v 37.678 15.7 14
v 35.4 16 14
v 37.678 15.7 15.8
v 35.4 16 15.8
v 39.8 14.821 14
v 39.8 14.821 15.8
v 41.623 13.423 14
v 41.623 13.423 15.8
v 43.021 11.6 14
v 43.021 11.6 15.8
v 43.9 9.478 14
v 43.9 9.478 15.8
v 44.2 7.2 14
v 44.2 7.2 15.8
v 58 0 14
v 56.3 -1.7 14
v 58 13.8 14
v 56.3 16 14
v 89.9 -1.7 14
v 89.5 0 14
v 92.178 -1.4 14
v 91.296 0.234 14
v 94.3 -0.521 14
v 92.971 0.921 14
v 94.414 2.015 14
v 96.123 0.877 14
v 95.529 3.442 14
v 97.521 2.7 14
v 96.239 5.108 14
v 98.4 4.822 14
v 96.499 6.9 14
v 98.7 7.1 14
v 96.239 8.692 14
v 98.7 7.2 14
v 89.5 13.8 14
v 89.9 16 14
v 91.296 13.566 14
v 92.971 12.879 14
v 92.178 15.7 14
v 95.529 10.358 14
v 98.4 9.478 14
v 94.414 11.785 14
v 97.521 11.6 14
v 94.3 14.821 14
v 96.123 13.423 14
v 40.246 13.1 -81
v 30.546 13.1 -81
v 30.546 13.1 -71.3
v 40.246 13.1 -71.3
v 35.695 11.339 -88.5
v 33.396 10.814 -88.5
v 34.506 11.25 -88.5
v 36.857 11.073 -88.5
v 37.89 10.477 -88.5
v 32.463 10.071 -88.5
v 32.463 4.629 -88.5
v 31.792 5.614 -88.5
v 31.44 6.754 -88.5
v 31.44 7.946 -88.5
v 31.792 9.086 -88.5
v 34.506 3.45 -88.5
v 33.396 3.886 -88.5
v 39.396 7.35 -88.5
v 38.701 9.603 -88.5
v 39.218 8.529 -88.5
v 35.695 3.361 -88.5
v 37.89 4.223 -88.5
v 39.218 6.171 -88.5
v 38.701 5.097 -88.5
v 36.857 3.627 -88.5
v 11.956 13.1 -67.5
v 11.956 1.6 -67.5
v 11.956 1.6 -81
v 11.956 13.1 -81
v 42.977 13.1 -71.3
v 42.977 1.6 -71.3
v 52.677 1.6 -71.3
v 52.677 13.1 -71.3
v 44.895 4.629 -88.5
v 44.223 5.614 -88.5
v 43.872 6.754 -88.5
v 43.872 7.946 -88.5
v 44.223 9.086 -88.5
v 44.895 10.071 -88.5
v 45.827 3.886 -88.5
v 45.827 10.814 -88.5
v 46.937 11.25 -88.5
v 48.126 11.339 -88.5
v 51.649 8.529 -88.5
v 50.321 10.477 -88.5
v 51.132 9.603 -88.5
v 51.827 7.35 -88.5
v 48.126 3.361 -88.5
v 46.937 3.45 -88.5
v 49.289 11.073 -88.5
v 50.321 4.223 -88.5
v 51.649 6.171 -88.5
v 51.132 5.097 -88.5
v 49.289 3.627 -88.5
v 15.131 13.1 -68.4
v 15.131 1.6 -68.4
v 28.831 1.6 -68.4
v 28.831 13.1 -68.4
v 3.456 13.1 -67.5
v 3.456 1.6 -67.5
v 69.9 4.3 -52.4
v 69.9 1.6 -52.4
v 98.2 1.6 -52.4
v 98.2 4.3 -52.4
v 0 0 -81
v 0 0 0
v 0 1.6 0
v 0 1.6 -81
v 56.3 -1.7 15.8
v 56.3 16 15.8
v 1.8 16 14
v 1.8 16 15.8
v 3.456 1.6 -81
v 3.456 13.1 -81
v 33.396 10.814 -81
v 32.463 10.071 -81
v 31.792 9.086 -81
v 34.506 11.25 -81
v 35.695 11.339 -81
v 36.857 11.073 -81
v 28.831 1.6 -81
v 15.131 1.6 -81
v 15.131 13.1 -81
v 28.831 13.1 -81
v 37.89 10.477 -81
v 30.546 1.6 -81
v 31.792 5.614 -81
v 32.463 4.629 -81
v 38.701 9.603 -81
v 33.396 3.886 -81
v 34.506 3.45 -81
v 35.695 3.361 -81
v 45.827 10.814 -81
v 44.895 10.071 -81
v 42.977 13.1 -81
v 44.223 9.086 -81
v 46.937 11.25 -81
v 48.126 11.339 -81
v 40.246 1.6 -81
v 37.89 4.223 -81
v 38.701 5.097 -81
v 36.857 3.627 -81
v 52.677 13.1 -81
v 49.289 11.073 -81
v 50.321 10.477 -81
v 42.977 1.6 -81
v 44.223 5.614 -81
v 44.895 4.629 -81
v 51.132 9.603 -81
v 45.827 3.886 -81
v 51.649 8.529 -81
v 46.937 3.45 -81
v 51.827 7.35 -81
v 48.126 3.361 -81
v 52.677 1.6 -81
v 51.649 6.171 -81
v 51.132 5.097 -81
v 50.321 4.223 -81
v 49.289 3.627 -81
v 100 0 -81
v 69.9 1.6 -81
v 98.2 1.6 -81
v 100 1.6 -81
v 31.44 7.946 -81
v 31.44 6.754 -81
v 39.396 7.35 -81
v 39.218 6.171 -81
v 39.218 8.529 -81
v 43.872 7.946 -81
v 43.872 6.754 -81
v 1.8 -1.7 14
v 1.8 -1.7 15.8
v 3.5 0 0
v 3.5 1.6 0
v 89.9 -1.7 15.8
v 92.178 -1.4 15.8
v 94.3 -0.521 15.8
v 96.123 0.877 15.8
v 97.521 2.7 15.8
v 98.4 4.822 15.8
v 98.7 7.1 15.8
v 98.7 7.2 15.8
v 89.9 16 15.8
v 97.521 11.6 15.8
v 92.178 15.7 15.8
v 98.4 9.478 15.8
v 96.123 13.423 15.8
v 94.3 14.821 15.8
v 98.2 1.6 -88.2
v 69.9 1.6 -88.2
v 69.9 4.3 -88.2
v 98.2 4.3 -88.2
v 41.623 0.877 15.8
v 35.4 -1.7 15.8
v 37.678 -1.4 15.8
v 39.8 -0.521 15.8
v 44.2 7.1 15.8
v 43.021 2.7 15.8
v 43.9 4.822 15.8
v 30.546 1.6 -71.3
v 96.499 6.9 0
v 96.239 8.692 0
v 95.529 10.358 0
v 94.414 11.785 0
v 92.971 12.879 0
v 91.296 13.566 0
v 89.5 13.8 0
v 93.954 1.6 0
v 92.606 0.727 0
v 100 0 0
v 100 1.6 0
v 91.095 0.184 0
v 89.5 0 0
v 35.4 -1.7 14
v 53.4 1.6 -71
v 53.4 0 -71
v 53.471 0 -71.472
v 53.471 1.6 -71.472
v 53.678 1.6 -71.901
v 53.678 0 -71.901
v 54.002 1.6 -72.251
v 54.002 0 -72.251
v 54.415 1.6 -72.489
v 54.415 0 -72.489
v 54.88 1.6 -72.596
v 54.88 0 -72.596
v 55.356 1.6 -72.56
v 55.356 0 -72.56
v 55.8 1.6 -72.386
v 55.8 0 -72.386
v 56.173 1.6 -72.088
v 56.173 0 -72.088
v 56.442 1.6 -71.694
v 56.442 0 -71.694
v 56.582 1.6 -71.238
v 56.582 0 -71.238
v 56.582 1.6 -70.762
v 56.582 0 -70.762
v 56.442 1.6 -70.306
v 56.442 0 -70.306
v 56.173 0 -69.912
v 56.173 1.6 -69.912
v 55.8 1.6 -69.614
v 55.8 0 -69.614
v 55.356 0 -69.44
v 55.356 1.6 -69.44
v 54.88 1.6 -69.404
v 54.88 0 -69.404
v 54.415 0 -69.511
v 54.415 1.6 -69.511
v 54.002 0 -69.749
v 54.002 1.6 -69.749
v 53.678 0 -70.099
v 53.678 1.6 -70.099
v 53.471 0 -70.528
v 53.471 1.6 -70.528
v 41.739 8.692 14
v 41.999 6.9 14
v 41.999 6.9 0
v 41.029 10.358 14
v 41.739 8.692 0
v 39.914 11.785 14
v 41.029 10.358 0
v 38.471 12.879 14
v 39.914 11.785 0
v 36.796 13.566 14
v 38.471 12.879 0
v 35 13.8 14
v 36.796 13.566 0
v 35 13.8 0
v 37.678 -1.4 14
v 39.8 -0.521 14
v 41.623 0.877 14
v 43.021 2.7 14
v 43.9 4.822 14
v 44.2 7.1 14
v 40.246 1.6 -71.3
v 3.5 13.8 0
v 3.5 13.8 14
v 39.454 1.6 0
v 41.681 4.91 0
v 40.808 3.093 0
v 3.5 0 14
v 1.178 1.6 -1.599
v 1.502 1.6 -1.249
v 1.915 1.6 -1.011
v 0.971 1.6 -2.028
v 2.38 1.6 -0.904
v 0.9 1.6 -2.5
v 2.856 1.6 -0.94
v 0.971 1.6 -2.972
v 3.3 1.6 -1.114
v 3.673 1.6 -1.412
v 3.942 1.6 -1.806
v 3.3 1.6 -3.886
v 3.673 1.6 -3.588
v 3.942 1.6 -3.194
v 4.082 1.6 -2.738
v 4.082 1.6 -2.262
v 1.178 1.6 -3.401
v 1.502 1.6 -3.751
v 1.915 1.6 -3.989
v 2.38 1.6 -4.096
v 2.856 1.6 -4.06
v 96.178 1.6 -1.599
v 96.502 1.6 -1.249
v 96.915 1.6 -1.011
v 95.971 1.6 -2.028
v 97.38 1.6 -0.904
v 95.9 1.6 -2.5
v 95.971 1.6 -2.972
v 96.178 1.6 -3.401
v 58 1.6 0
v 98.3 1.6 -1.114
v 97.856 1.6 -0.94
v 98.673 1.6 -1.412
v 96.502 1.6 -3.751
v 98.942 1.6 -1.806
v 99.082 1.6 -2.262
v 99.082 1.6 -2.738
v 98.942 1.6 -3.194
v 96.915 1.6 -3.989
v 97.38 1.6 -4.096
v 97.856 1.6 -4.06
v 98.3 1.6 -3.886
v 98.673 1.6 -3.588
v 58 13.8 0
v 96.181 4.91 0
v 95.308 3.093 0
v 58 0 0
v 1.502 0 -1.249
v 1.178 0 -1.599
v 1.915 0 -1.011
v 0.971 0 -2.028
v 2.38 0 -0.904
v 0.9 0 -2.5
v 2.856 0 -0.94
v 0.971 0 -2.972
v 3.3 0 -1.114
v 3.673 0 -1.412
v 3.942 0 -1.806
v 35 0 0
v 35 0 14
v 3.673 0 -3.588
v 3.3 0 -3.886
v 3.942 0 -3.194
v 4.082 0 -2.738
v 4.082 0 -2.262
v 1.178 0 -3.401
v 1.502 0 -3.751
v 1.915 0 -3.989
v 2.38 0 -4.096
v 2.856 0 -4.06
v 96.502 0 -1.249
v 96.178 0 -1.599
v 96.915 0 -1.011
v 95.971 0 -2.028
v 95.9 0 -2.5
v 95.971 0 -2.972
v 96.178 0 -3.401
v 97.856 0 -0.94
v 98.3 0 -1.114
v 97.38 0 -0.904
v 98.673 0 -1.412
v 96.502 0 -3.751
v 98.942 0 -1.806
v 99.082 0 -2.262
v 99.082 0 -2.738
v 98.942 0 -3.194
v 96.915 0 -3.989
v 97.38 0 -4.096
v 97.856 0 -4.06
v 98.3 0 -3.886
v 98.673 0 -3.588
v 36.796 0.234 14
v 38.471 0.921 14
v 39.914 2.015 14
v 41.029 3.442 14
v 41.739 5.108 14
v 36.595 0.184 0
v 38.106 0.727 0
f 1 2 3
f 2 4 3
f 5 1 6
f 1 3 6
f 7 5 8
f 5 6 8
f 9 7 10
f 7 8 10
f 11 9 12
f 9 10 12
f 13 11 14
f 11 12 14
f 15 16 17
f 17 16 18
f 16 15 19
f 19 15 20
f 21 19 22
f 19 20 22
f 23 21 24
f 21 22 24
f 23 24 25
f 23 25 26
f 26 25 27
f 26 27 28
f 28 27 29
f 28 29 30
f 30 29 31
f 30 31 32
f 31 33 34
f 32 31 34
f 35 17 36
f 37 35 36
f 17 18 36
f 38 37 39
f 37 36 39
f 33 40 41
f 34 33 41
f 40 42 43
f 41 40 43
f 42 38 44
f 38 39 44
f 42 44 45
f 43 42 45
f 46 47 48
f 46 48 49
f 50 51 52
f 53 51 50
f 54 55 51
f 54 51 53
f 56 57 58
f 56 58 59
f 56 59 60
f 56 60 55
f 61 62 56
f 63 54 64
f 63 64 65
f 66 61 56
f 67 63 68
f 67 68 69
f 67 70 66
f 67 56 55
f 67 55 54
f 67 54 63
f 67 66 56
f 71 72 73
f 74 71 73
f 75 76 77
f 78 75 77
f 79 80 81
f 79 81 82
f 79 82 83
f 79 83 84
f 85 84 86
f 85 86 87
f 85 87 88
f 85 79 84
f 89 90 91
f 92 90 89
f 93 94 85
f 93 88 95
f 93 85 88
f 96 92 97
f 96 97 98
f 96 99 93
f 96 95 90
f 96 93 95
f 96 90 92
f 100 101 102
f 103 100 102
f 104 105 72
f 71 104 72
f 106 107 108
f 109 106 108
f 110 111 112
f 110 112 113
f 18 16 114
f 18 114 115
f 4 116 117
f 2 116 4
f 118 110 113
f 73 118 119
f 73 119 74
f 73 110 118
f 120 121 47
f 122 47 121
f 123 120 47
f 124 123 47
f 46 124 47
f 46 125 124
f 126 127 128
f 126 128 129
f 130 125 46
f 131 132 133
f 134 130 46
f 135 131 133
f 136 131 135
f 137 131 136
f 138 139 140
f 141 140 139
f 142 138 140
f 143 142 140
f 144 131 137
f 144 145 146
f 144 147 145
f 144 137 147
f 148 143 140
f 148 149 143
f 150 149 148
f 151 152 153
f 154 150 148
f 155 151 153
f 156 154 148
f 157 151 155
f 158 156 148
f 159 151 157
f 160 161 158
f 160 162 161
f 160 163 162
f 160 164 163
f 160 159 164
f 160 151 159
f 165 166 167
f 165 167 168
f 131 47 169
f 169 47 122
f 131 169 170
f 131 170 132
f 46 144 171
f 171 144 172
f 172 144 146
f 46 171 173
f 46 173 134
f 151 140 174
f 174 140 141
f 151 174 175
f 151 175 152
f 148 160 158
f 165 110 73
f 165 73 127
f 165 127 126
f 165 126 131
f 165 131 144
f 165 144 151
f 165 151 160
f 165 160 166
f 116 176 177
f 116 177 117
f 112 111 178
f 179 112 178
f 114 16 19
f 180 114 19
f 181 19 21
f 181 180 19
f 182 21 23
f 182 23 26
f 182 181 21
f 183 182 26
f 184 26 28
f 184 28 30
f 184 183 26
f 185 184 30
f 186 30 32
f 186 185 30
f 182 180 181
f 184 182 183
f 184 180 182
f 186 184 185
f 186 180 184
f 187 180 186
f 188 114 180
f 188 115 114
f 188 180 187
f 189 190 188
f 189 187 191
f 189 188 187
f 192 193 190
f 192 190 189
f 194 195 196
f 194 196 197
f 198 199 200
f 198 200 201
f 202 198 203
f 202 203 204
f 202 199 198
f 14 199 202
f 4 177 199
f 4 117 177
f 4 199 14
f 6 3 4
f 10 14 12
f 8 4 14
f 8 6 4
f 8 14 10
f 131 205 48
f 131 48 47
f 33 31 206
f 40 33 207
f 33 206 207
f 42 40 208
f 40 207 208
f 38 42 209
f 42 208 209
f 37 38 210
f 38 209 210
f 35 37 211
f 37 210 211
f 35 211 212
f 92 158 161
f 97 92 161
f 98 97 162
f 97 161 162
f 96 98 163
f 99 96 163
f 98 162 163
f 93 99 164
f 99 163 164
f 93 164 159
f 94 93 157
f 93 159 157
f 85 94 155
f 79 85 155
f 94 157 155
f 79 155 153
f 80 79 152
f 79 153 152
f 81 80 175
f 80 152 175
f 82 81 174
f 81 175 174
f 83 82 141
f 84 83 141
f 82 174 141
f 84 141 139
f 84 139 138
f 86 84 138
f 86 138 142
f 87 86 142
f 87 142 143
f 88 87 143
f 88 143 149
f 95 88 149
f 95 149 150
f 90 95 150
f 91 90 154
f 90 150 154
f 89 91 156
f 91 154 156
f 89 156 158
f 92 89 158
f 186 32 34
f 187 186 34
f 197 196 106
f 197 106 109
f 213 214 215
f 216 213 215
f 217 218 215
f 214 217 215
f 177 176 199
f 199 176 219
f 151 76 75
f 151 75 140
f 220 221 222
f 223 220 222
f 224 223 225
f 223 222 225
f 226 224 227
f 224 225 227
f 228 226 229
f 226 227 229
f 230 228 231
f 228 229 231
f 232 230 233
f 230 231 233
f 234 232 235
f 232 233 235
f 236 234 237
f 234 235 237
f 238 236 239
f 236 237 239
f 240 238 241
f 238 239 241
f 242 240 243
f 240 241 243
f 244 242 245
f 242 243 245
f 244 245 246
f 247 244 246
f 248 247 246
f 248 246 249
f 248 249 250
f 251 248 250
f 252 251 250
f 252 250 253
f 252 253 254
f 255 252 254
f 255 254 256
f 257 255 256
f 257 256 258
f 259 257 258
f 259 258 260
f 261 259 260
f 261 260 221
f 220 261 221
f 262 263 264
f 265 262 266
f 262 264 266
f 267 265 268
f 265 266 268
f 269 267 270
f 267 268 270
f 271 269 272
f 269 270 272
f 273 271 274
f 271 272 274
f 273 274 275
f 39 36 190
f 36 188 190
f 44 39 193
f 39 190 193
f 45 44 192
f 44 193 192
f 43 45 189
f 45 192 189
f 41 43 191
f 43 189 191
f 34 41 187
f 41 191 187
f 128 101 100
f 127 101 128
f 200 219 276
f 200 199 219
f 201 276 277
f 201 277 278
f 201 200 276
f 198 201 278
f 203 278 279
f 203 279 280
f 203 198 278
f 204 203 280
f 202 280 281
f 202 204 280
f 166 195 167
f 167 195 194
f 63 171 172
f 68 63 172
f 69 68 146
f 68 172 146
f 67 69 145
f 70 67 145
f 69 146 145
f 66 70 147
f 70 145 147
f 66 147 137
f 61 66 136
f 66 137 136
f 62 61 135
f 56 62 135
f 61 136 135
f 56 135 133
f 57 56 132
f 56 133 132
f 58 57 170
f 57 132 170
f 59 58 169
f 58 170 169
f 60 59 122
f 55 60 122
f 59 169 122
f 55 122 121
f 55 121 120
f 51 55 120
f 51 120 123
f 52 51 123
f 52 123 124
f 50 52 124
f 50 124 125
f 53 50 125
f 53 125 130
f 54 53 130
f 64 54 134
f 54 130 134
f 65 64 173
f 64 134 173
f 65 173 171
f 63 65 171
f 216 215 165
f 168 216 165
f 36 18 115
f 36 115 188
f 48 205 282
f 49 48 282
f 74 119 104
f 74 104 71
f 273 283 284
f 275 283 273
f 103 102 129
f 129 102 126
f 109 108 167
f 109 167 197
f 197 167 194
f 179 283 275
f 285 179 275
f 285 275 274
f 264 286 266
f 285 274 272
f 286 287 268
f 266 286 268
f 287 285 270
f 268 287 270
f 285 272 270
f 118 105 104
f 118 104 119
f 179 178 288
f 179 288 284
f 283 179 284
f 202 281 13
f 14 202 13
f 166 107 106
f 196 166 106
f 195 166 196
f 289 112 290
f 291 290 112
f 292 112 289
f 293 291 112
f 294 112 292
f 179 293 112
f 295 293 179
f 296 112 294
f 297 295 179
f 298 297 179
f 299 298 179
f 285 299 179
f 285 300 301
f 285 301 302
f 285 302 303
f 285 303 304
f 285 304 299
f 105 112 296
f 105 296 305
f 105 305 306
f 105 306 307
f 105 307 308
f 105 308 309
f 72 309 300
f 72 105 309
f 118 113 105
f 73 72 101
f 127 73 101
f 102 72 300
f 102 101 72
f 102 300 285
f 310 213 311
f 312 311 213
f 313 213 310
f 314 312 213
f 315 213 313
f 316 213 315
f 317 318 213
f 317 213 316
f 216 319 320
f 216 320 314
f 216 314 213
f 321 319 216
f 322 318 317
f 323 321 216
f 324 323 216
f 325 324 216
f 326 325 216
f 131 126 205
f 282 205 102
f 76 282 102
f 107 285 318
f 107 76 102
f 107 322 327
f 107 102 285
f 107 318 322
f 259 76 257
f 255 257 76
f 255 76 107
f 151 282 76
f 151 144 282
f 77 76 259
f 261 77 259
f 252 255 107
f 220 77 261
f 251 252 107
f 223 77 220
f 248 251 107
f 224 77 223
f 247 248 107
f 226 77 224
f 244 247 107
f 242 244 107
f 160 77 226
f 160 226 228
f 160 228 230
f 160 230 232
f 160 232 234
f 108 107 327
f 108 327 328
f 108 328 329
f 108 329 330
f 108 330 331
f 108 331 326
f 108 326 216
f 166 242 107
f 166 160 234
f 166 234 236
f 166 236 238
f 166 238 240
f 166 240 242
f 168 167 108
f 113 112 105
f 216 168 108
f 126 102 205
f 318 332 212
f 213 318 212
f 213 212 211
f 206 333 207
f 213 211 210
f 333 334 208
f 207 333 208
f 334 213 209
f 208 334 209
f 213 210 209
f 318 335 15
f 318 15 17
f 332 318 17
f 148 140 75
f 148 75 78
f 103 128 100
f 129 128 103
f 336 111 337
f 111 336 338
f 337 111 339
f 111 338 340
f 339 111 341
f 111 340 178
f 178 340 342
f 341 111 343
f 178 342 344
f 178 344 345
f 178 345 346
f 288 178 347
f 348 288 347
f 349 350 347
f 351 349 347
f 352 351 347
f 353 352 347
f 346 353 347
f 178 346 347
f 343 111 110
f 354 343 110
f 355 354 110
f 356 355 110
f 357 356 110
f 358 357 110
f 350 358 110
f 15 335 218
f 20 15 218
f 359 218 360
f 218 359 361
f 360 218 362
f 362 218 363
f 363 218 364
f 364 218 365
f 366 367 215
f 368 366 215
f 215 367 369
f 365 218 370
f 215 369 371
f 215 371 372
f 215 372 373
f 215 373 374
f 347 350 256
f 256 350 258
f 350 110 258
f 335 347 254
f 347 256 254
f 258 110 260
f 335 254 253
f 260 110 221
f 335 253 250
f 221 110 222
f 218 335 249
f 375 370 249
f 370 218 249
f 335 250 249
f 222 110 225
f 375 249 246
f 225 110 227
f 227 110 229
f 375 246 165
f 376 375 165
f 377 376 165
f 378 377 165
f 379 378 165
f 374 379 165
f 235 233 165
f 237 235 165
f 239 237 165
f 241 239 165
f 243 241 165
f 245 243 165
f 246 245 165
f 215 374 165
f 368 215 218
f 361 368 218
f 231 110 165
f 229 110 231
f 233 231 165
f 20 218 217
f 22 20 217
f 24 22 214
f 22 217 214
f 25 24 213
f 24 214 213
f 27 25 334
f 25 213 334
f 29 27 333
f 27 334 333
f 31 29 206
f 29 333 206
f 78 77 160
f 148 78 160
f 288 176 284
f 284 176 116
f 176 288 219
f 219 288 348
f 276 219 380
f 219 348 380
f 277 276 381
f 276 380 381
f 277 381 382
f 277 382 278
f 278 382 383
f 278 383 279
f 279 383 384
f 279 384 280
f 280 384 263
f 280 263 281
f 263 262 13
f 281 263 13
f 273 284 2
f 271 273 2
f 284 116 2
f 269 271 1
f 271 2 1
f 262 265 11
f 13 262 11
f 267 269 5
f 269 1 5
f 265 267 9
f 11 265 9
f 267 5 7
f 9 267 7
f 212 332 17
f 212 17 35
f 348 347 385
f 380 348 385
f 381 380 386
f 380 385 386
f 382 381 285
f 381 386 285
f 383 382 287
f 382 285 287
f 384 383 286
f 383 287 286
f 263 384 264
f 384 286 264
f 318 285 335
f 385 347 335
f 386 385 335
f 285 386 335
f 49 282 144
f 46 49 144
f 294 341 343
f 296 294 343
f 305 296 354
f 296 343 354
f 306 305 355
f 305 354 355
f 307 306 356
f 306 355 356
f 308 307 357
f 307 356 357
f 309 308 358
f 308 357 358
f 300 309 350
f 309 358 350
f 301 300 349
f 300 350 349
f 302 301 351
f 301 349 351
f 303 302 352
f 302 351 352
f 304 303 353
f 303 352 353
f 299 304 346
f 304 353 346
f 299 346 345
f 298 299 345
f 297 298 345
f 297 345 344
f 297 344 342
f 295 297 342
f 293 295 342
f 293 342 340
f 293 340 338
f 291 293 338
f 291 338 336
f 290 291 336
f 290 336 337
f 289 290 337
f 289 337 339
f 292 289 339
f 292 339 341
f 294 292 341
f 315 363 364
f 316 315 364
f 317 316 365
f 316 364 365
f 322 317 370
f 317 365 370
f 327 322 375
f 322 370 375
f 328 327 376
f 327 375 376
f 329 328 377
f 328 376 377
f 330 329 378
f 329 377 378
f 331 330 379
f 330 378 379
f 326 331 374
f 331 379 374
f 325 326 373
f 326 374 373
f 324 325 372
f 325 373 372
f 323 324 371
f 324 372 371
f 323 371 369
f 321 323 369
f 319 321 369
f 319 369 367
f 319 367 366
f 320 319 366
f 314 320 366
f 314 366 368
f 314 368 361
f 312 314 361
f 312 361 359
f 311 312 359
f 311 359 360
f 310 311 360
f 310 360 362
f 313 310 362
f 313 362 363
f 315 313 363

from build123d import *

# Parameters (mm, degrees)
SKETCH1_W            = 100
SKETCH1_H            = 81
BOSS_EXTRUDE1_DEPTH  = 1.6
SKETCH2_W            = 38.5
SKETCH2_H            = 13.8
BOSS_EXTRUDE2_DEPTH  = 14
SKETCH3_W            = 42.4
SKETCH3_H            = 17.7
BOSS_EXTRUDE3_DEPTH  = 1.8
SKETCH4_W            = 8.5
SKETCH4_H            = 13.5
SKETCH4_W_2          = 13.7
SKETCH4_H_2          = 12.6
SKETCH4_W_3          = 9.7
SKETCH4_H_3          = 9.7
BOSS_EXTRUDE4_DEPTH  = 11.5
SKETCH5_W            = 28.3
SKETCH5_H            = 35.8
BOSS_EXTRUDE5_DEPTH  = 2.7
SKETCH6_R            = 4
BOSS_EXTRUDE6_DEPTH  = 7.5
M3_CLEARANCE_SLOT1_D = 3.2
FILLET1_R            = 7
FILLET2_R            = 8.8


with BuildPart() as part:
    # Sketch1 → Boss-Extrude1 (new body)
    with BuildSketch(Plane(origin=(0, 0, 0), x_dir=(1, 0, 0), z_dir=(0, 1, 0))):
        with Locations((50, 40.5)):
            Rectangle(SKETCH1_W, SKETCH1_H)
    extrude(amount=BOSS_EXTRUDE1_DEPTH)

    # Sketch2 → Boss-Extrude2 (add)
    with BuildSketch(Plane.XY):
        with Locations((77.25, 6.9)):
            Rectangle(SKETCH2_W, SKETCH2_H)
        with Locations((22.75, 6.9)):
            Rectangle(SKETCH2_W, SKETCH2_H)
    extrude(amount=BOSS_EXTRUDE2_DEPTH)

    # Sketch3 → Boss-Extrude3 (add)
    with BuildSketch(Plane.XY.offset(14)):
        with Locations((23, 7.15)):
            Rectangle(SKETCH3_W, SKETCH3_H)
        with Locations((77.5, 7.15)):
            Rectangle(SKETCH3_W, SKETCH3_H)
    extrude(amount=BOSS_EXTRUDE3_DEPTH)

    # Sketch4 → Boss-Extrude4 (add)
    with BuildSketch(Plane(origin=(0, 1.6, 0), x_dir=(1, 0, 0), z_dir=(0, 1, 0))):
        with Locations((7.706498822, 74.25)):
            Rectangle(SKETCH4_W, SKETCH4_H)
        with Locations((21.980965093, 74.7)):
            Rectangle(SKETCH4_W_2, SKETCH4_H_2)
        with Locations((35.395626501, 76.15)):
            Rectangle(SKETCH4_W_3, SKETCH4_H_3)
        with Locations((47.82718522, 76.15)):
            Rectangle(SKETCH4_W_3, SKETCH4_H_3)
    extrude(amount=BOSS_EXTRUDE4_DEPTH)

    # Sketch5 → Boss-Extrude5 (add)
    with BuildSketch(Plane(origin=(0, 1.6, 0), x_dir=(1, 0, 0), z_dir=(0, 1, 0))):
        with Locations((84.05, 70.3)):
            Rectangle(SKETCH5_W, SKETCH5_H)
    extrude(amount=BOSS_EXTRUDE5_DEPTH)

    # Sketch6 → Boss-Extrude6 (add)
    with BuildSketch(Plane(origin=(0, 0, -81), x_dir=(-1, 0, 0), z_dir=(0, 0, -1))):
        with Locations(Location((-47.82718522, 7.35, 0), (0, 0, 180))):
            Circle(SKETCH6_R)
        with Locations(Location((-35.395626501, 7.35, 0), (0, 0, 180))):
            Circle(SKETCH6_R)
    extrude(amount=BOSS_EXTRUDE6_DEPTH)

    # M3 Clearance Slot1 (through all)
    with Locations(Plane(origin=(0, 1.6, 0), x_dir=(1, 0, 0), z_dir=(0, 1, 0))):
        with Locations((55, 71), (97.5, 2.5), (2.5, 2.5)):
            Hole(M3_CLEARANCE_SLOT1_D / 2)

    # Fillet1
    # the kernel refuses this fillet: 7 mm, written as the material it takes off along each edge
    with BuildSketch(Plane(origin=(42, 0, 0), x_dir=(-1, 0, 0), z_dir=(0, 0, 1)), Plane(origin=(96.5, 0, 0), x_dir=(-1, 0, 0), z_dir=(0, 0, 1))) as fillet1_piece_1:
        with BuildLine():
            CenterArc((FILLET1_R, -FILLET1_R), FILLET1_R, 90, 90)
            Line((0, -FILLET1_R), (0, 0))
            Line((0, 0), (FILLET1_R, 0))
        make_face()
    extrude(amount=14, mode=Mode.SUBTRACT)
    with BuildSketch(Plane(origin=(42, 13.8, -17.5), x_dir=(0, -1, 0), z_dir=(0, 0, 1)), Plane(origin=(96.5, 13.8, -17.5), x_dir=(0, -1, 0), z_dir=(0, 0, 1))) as fillet1_piece_2:
        with BuildLine():
            CenterArc((FILLET1_R, -FILLET1_R), FILLET1_R, 90, 90)
            Line((0, -FILLET1_R), (0, 0))
            Line((0, 0), (FILLET1_R, 0))
        make_face()
    extrude(amount=31.5, mode=Mode.SUBTRACT)

    # Fillet2
    fillet2_edges = [part.edges().sort_by_distance(p)[0] for p in [
        (44.2, -1.7, 14.9),
        (44.2, 16, 14.9),
        (98.7, -1.7, 14.9),
        (98.7, 16, 14.9),
    ]]
    fillet(fillet2_edges, radius=FILLET2_R)


solid = part.part
